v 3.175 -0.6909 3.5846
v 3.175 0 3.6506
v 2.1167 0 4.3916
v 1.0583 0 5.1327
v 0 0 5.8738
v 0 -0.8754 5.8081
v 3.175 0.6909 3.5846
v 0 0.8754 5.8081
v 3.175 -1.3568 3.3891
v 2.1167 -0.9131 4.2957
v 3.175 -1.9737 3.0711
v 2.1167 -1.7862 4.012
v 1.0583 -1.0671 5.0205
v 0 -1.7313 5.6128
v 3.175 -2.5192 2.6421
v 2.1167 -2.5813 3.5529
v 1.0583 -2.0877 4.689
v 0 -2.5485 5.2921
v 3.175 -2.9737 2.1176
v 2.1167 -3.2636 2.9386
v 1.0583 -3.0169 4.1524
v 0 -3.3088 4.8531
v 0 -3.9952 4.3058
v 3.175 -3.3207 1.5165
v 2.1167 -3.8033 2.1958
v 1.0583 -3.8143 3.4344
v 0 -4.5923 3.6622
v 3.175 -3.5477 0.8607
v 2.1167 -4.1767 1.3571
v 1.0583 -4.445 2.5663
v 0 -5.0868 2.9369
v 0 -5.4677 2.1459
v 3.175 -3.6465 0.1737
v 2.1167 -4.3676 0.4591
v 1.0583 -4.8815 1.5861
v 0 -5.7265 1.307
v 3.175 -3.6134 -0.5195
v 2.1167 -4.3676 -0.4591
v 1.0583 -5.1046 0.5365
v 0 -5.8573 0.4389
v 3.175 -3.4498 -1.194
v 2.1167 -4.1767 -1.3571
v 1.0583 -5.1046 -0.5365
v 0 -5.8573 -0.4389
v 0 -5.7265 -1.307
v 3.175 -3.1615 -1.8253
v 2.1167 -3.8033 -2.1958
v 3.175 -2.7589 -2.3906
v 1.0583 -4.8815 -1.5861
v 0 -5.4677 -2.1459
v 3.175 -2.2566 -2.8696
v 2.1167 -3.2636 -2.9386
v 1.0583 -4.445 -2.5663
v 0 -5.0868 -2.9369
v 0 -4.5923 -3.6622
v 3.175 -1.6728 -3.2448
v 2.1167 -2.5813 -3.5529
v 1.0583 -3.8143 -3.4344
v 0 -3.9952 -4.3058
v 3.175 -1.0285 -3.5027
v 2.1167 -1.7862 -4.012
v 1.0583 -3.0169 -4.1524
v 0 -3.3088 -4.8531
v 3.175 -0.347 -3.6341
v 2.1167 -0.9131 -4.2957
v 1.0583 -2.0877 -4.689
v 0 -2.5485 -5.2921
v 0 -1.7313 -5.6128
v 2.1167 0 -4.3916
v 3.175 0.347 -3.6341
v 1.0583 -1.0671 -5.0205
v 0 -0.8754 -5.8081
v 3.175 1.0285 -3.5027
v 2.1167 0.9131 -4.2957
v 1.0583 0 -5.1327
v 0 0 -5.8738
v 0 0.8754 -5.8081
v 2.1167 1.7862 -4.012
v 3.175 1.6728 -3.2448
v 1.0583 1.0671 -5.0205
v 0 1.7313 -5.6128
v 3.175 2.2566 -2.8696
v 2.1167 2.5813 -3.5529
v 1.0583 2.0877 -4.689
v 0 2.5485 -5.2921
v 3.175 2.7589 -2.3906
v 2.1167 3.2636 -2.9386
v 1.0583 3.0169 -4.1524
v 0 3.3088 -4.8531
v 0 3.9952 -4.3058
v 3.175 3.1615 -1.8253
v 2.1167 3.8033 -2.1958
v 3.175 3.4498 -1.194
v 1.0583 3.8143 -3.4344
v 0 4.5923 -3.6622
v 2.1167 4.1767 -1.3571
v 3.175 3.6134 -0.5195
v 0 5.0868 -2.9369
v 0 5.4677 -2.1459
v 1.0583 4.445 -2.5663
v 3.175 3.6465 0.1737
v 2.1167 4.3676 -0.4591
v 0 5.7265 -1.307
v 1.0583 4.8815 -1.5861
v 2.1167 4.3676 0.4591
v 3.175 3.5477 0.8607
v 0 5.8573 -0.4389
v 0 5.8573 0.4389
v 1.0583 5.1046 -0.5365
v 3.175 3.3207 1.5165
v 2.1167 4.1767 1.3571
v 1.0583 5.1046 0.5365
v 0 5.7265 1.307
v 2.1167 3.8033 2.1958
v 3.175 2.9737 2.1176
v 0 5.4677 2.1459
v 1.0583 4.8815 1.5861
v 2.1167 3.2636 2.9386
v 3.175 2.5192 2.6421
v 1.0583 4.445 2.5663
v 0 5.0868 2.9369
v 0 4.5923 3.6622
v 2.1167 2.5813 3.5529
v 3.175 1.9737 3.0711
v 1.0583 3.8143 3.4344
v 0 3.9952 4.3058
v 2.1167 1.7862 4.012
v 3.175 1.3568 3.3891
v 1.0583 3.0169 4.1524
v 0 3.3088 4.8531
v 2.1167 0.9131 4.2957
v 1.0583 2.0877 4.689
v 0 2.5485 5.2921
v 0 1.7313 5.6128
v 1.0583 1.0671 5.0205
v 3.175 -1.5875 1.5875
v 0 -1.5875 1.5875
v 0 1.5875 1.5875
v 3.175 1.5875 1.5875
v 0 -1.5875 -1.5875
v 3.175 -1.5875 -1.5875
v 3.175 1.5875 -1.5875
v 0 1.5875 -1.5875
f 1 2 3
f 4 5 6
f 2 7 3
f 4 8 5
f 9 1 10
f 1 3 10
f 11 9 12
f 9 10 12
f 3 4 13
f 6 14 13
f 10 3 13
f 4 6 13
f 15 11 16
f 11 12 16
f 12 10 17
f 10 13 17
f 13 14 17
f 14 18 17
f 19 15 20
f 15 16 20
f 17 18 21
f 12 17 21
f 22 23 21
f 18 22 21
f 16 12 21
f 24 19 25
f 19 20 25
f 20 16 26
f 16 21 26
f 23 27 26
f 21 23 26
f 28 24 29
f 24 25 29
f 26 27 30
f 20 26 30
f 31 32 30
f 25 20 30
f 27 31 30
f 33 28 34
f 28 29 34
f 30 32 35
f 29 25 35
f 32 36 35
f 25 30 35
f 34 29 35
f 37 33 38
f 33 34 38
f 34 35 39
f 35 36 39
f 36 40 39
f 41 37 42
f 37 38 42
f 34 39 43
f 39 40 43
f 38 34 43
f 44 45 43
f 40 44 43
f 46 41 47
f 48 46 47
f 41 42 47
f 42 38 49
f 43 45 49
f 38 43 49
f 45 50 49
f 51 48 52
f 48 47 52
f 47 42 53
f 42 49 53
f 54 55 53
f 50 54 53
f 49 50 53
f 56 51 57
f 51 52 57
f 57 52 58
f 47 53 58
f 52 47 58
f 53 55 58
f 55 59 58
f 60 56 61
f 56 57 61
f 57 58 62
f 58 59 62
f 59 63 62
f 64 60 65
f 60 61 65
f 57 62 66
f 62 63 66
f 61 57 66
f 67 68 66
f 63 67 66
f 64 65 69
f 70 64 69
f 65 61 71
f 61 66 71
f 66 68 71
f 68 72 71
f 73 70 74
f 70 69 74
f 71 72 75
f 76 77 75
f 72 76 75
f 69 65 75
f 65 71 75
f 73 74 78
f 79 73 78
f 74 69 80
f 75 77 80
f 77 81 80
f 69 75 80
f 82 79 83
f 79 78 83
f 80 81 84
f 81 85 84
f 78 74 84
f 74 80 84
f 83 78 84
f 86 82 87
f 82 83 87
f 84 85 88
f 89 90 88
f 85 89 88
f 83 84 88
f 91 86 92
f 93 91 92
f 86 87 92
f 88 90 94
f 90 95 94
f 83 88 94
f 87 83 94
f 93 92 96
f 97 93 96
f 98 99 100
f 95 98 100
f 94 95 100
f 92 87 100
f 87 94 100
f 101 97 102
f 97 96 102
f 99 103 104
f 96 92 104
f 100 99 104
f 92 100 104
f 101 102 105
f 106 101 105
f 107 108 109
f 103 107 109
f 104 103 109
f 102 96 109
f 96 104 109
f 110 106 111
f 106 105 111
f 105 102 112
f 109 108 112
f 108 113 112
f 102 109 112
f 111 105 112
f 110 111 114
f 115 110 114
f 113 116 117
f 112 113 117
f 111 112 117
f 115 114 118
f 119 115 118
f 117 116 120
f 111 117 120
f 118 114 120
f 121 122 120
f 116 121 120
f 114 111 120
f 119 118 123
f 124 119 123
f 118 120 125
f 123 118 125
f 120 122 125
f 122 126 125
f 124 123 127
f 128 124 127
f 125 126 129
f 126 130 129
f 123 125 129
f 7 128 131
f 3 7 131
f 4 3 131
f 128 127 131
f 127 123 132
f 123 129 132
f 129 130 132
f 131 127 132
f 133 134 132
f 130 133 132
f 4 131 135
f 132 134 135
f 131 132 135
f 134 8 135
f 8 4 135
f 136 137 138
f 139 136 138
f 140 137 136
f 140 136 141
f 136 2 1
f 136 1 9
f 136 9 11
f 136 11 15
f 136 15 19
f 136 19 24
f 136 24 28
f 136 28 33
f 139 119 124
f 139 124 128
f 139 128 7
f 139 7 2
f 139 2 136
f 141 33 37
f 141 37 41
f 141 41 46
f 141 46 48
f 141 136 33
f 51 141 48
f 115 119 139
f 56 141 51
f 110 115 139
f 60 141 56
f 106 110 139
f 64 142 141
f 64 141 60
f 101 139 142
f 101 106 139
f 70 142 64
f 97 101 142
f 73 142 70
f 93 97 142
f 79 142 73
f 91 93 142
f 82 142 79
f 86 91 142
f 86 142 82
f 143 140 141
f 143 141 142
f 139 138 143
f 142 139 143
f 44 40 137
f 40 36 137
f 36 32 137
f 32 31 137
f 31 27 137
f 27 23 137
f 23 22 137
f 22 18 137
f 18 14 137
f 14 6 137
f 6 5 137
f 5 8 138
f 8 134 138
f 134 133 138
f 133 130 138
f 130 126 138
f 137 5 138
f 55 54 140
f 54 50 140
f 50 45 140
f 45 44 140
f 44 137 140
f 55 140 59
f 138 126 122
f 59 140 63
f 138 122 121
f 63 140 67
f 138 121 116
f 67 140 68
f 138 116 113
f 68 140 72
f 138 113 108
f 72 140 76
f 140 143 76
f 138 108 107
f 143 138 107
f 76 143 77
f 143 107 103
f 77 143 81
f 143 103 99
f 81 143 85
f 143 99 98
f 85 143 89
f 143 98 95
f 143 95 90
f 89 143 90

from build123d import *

# Parameters (mm, degrees)
SKETCH1_R           = 5.87375
SKETCH1_W           = 3.175
SKETCH1_H           = 3.175
BOSS_EXTRUDE1_DEPTH = 3.175


with BuildPart() as part:
    # Sketch1 → Boss-Extrude1 (new body)
    with BuildSketch(Plane(origin=(0, 0, 0), x_dir=(0, 0, -1), z_dir=(1, 0, 0))):
        Circle(SKETCH1_R)
        Rectangle(SKETCH1_W, SKETCH1_H, mode=Mode.SUBTRACT)
    extrude(amount=BOSS_EXTRUDE1_DEPTH)

    # Sketch2 → Cut-Revolve1 (revolve, cut)
    with BuildSketch(Plane.XY, mode=Mode.PRIVATE) as cut_revolve1_sk:
        Polygon((0, 5.87375), (3.175, 5.87375), (3.175, 3.650591066), align=None)
    revolve(cut_revolve1_sk.sketch.rotate(Axis((0, 0, 0), (1, 0, 0)), 90), axis=Axis((0, 0, 0), (1, 0, 0)), mode=Mode.SUBTRACT)


solid = part.part
